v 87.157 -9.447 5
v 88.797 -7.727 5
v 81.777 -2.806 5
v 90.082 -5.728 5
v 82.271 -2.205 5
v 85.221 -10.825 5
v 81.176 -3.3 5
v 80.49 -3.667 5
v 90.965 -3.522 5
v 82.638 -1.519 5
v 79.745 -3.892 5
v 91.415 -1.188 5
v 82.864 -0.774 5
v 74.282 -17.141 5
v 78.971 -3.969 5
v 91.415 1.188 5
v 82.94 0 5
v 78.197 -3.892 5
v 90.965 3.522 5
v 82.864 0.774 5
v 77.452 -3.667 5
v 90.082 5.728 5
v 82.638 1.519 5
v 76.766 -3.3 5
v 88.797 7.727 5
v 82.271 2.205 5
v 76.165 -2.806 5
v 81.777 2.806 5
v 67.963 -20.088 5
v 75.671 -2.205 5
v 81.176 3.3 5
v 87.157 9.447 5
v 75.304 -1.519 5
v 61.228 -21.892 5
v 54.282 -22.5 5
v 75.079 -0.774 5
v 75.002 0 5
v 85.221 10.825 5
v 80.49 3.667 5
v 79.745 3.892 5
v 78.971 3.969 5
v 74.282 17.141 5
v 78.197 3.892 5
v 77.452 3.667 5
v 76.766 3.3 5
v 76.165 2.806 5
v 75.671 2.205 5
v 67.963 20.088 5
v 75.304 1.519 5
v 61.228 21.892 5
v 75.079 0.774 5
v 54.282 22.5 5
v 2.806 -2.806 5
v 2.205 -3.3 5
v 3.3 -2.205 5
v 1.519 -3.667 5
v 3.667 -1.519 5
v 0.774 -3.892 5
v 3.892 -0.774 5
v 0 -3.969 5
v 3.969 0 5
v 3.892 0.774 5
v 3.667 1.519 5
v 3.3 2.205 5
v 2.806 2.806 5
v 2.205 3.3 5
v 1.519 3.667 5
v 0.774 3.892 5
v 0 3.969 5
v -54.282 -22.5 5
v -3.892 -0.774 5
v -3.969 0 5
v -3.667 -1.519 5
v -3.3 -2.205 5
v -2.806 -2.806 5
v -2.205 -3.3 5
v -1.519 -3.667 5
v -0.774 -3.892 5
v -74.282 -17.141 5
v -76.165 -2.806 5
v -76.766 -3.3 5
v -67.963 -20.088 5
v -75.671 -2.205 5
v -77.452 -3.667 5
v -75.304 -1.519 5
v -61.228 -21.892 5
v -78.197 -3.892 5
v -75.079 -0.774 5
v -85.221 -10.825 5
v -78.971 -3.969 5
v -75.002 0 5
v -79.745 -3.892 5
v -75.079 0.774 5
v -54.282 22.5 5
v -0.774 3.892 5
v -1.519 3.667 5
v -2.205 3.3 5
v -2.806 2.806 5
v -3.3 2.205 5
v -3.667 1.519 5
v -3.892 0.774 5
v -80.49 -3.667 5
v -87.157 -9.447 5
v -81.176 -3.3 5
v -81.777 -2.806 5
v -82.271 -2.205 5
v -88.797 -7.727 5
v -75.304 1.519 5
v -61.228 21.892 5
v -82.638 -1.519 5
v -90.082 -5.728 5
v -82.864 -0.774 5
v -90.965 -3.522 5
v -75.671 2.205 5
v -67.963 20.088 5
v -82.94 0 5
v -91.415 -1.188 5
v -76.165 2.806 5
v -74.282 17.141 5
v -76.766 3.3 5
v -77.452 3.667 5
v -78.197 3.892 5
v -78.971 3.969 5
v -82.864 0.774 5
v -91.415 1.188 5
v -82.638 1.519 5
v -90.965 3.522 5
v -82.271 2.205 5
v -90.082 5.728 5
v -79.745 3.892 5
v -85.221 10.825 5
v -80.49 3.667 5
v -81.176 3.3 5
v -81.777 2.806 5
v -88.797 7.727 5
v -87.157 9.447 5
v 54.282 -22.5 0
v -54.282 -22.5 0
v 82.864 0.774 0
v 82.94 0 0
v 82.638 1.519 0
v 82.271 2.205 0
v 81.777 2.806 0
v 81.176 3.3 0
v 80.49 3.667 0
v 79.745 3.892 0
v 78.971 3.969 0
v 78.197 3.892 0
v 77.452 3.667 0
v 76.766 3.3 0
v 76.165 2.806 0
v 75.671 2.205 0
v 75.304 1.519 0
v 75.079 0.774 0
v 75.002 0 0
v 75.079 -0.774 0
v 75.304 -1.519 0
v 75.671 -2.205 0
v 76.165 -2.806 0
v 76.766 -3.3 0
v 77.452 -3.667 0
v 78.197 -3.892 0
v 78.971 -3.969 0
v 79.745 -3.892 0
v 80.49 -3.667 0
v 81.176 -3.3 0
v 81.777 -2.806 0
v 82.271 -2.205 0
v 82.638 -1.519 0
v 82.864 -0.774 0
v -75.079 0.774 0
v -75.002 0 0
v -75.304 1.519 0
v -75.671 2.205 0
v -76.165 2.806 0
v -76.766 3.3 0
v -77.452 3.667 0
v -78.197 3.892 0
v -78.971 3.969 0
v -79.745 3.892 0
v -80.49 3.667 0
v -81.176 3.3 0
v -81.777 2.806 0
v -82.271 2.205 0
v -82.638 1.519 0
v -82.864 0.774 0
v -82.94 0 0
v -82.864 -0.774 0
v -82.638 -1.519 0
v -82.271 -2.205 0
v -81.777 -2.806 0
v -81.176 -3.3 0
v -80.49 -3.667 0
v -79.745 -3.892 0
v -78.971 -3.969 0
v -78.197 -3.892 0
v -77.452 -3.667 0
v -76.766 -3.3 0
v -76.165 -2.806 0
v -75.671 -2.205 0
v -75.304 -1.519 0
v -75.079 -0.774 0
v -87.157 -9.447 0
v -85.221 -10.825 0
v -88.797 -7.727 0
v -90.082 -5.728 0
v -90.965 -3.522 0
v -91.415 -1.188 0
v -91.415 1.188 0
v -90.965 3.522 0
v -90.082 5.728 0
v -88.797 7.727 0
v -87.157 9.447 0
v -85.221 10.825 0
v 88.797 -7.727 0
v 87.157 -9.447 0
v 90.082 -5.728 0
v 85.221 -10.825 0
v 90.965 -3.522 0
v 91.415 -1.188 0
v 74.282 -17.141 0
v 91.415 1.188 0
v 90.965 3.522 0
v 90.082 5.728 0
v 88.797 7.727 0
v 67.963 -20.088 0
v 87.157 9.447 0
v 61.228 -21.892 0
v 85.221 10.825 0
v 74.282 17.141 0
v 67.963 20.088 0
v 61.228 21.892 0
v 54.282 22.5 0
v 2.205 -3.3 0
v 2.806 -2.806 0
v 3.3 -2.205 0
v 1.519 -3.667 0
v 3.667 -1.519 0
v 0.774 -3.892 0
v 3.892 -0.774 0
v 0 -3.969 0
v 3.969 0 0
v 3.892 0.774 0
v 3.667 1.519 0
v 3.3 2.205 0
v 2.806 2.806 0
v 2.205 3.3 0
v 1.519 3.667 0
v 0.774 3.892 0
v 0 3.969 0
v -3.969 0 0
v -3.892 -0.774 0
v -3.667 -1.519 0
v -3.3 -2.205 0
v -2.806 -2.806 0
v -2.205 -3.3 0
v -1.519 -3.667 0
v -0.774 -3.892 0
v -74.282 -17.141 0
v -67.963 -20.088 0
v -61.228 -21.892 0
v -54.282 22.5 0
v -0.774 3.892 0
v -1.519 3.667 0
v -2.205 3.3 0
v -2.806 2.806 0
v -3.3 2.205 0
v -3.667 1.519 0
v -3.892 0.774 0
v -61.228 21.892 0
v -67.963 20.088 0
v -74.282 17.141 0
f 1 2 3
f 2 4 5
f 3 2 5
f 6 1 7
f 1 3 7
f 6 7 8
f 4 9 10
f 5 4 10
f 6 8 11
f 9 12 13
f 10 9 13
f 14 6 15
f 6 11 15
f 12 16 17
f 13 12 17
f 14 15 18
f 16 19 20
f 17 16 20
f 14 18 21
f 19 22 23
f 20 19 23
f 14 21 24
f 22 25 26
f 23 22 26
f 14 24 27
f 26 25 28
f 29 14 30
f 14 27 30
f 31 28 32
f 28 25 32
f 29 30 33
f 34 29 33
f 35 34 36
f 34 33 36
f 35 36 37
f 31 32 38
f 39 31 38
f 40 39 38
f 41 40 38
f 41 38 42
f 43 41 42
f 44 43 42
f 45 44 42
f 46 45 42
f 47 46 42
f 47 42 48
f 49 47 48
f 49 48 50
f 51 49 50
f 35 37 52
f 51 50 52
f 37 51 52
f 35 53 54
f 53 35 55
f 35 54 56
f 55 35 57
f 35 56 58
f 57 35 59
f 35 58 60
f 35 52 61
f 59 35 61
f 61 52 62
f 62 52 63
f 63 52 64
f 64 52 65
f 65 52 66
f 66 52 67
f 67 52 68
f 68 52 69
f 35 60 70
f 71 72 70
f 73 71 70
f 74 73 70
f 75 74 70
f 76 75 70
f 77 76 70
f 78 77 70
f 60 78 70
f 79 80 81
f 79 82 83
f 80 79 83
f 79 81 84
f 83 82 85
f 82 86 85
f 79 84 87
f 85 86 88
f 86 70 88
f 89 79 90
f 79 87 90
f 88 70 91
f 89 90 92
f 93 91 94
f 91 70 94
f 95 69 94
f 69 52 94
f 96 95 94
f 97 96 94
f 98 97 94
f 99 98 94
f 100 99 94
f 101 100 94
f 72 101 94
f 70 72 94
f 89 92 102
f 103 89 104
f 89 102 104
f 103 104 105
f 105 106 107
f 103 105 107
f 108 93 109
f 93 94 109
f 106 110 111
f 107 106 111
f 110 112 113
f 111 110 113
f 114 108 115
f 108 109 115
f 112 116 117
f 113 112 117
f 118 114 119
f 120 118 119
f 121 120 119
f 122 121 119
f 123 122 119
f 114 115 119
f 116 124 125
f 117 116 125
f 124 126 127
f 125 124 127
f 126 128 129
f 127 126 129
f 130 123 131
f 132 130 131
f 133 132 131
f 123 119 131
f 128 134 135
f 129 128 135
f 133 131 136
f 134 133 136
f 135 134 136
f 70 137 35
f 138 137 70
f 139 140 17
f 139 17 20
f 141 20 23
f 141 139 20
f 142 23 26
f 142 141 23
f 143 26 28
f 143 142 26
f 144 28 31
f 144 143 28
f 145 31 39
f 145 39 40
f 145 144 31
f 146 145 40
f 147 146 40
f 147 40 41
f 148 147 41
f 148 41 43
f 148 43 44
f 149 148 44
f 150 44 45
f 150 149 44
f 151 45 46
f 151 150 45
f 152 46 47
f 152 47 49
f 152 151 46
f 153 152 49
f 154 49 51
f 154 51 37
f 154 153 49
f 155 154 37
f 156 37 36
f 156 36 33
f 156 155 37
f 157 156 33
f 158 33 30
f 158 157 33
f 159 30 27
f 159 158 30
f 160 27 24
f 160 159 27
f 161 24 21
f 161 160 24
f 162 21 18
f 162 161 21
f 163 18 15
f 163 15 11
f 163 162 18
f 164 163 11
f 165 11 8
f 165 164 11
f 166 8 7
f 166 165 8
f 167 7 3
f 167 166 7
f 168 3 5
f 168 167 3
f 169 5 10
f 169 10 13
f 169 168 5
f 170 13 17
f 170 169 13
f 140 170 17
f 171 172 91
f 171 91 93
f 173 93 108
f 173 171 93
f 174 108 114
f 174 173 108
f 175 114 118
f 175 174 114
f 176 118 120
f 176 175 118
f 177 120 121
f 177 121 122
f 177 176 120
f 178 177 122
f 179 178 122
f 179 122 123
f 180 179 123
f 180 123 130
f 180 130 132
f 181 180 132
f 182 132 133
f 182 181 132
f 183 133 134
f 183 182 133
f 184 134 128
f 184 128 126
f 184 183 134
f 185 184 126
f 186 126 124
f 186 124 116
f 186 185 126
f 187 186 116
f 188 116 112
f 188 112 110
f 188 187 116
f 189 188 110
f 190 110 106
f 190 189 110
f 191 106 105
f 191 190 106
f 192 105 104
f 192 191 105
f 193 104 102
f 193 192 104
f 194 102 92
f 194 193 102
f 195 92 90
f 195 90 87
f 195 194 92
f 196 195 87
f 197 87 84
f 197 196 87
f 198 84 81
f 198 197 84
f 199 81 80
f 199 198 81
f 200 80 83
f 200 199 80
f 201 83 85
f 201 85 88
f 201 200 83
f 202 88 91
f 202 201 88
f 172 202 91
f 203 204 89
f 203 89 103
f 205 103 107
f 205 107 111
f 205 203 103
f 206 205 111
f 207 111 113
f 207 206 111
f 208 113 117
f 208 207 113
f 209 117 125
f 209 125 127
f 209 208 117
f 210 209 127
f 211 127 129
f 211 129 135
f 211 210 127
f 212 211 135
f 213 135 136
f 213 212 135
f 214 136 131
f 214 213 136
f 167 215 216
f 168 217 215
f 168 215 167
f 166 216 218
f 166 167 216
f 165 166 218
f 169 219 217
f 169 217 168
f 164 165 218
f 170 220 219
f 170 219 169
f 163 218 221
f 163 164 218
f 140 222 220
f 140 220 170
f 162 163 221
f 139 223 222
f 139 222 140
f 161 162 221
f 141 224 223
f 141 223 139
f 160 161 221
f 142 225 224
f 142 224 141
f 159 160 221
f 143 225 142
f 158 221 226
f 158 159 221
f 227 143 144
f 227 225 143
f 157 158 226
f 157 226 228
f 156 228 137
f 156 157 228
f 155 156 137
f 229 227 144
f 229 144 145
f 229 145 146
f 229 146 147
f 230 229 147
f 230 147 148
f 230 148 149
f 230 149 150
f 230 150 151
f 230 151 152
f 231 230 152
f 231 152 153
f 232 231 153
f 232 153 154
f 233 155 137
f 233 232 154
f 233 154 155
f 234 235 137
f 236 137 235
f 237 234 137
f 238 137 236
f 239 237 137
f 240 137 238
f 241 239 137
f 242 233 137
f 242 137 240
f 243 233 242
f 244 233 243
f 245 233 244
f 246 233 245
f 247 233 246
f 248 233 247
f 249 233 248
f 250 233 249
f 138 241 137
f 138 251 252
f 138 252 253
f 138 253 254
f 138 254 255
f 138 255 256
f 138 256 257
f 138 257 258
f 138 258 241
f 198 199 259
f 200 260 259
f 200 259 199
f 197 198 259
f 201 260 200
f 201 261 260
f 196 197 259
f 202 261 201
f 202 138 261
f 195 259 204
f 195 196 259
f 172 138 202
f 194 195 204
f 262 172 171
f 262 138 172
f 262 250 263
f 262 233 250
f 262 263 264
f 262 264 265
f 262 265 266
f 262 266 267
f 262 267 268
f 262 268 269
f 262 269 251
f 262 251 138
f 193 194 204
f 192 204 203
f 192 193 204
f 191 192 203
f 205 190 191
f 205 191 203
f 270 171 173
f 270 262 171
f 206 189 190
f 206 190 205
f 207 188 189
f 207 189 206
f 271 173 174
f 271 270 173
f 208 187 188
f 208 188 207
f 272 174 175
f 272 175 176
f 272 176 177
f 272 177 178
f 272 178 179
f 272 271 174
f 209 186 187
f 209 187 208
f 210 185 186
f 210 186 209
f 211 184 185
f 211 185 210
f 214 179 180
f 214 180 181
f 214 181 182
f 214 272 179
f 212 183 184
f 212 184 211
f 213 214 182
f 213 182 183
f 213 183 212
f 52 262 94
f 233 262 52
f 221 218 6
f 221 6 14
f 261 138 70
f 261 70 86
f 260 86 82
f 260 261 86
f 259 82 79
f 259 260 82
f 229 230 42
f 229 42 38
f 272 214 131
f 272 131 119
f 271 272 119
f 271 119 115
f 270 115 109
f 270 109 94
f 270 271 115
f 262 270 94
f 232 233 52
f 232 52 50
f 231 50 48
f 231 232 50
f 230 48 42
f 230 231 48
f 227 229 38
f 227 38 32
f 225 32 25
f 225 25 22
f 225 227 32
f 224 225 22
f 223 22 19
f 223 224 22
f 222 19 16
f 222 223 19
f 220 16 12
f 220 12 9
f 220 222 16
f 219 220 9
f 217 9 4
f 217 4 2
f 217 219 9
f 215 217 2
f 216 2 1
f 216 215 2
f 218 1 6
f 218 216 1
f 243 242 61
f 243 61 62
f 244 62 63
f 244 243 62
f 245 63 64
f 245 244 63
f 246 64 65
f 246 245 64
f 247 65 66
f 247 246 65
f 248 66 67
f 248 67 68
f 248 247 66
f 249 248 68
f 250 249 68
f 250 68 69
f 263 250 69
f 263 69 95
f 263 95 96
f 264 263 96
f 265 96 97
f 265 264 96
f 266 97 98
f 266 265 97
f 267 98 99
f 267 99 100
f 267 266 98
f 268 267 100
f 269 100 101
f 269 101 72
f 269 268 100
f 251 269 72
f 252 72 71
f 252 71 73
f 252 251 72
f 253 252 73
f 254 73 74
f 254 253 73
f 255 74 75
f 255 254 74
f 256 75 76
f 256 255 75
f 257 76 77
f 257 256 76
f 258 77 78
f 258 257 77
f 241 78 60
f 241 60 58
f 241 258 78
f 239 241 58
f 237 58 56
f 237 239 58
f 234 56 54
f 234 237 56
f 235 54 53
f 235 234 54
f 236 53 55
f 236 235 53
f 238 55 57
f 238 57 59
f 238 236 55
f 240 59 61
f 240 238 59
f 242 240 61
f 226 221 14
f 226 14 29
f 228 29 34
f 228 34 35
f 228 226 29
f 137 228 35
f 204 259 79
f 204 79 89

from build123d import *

# Parameters (mm, degrees)
SKETCH1_R           = 3.96875
BOSS_EXTRUDE2_DEPTH = 5


with BuildPart() as part:
    # Sketch1 → Boss-Extrude2 (new body)
    with BuildSketch(Plane.XY):
        with BuildLine():
            Line((-54.282032303, 22.5), (54.282032303, 22.5))
            ThreePointArc((54.282032303, 22.5), (64.634794107, 21.137033052), (74.282032303, 17.141016151))
            Line((74.282032303, 17.141016151), (85.22114317, 10.825317547))
            ThreePointArc((85.22114317, 10.825317547), (91.47114317, 0), (85.22114317, -10.825317547))
            Line((85.22114317, -10.825317547), (74.282032303, -17.141016151))
            ThreePointArc((74.282032303, -17.141016151), (64.634794107, -21.137033052), (54.282032303, -22.5))
            Line((54.282032303, -22.5), (-54.282032303, -22.5))
            ThreePointArc((-54.282032303, -22.5), (-64.634794107, -21.137033052), (-74.282032303, -17.141016151))
            Line((-74.282032303, -17.141016151), (-85.22114317, -10.825317547))
            ThreePointArc((-85.22114317, -10.825317547), (-91.47114317, 0), (-85.22114317, 10.825317547))
            Line((-85.22114317, 10.825317547), (-74.282032303, 17.141016151))
            ThreePointArc((-74.282032303, 17.141016151), (-64.634794107, 21.137033052), (-54.282032303, 22.5))
        make_face()
        with Locations((-78.97114317, 0)):
            Circle(SKETCH1_R, mode=Mode.SUBTRACT)
        with Locations((78.97114317, 0)):
            Circle(SKETCH1_R, mode=Mode.SUBTRACT)
        Circle(SKETCH1_R, mode=Mode.SUBTRACT)
    extrude(amount=BOSS_EXTRUDE2_DEPTH)


solid = part.part
